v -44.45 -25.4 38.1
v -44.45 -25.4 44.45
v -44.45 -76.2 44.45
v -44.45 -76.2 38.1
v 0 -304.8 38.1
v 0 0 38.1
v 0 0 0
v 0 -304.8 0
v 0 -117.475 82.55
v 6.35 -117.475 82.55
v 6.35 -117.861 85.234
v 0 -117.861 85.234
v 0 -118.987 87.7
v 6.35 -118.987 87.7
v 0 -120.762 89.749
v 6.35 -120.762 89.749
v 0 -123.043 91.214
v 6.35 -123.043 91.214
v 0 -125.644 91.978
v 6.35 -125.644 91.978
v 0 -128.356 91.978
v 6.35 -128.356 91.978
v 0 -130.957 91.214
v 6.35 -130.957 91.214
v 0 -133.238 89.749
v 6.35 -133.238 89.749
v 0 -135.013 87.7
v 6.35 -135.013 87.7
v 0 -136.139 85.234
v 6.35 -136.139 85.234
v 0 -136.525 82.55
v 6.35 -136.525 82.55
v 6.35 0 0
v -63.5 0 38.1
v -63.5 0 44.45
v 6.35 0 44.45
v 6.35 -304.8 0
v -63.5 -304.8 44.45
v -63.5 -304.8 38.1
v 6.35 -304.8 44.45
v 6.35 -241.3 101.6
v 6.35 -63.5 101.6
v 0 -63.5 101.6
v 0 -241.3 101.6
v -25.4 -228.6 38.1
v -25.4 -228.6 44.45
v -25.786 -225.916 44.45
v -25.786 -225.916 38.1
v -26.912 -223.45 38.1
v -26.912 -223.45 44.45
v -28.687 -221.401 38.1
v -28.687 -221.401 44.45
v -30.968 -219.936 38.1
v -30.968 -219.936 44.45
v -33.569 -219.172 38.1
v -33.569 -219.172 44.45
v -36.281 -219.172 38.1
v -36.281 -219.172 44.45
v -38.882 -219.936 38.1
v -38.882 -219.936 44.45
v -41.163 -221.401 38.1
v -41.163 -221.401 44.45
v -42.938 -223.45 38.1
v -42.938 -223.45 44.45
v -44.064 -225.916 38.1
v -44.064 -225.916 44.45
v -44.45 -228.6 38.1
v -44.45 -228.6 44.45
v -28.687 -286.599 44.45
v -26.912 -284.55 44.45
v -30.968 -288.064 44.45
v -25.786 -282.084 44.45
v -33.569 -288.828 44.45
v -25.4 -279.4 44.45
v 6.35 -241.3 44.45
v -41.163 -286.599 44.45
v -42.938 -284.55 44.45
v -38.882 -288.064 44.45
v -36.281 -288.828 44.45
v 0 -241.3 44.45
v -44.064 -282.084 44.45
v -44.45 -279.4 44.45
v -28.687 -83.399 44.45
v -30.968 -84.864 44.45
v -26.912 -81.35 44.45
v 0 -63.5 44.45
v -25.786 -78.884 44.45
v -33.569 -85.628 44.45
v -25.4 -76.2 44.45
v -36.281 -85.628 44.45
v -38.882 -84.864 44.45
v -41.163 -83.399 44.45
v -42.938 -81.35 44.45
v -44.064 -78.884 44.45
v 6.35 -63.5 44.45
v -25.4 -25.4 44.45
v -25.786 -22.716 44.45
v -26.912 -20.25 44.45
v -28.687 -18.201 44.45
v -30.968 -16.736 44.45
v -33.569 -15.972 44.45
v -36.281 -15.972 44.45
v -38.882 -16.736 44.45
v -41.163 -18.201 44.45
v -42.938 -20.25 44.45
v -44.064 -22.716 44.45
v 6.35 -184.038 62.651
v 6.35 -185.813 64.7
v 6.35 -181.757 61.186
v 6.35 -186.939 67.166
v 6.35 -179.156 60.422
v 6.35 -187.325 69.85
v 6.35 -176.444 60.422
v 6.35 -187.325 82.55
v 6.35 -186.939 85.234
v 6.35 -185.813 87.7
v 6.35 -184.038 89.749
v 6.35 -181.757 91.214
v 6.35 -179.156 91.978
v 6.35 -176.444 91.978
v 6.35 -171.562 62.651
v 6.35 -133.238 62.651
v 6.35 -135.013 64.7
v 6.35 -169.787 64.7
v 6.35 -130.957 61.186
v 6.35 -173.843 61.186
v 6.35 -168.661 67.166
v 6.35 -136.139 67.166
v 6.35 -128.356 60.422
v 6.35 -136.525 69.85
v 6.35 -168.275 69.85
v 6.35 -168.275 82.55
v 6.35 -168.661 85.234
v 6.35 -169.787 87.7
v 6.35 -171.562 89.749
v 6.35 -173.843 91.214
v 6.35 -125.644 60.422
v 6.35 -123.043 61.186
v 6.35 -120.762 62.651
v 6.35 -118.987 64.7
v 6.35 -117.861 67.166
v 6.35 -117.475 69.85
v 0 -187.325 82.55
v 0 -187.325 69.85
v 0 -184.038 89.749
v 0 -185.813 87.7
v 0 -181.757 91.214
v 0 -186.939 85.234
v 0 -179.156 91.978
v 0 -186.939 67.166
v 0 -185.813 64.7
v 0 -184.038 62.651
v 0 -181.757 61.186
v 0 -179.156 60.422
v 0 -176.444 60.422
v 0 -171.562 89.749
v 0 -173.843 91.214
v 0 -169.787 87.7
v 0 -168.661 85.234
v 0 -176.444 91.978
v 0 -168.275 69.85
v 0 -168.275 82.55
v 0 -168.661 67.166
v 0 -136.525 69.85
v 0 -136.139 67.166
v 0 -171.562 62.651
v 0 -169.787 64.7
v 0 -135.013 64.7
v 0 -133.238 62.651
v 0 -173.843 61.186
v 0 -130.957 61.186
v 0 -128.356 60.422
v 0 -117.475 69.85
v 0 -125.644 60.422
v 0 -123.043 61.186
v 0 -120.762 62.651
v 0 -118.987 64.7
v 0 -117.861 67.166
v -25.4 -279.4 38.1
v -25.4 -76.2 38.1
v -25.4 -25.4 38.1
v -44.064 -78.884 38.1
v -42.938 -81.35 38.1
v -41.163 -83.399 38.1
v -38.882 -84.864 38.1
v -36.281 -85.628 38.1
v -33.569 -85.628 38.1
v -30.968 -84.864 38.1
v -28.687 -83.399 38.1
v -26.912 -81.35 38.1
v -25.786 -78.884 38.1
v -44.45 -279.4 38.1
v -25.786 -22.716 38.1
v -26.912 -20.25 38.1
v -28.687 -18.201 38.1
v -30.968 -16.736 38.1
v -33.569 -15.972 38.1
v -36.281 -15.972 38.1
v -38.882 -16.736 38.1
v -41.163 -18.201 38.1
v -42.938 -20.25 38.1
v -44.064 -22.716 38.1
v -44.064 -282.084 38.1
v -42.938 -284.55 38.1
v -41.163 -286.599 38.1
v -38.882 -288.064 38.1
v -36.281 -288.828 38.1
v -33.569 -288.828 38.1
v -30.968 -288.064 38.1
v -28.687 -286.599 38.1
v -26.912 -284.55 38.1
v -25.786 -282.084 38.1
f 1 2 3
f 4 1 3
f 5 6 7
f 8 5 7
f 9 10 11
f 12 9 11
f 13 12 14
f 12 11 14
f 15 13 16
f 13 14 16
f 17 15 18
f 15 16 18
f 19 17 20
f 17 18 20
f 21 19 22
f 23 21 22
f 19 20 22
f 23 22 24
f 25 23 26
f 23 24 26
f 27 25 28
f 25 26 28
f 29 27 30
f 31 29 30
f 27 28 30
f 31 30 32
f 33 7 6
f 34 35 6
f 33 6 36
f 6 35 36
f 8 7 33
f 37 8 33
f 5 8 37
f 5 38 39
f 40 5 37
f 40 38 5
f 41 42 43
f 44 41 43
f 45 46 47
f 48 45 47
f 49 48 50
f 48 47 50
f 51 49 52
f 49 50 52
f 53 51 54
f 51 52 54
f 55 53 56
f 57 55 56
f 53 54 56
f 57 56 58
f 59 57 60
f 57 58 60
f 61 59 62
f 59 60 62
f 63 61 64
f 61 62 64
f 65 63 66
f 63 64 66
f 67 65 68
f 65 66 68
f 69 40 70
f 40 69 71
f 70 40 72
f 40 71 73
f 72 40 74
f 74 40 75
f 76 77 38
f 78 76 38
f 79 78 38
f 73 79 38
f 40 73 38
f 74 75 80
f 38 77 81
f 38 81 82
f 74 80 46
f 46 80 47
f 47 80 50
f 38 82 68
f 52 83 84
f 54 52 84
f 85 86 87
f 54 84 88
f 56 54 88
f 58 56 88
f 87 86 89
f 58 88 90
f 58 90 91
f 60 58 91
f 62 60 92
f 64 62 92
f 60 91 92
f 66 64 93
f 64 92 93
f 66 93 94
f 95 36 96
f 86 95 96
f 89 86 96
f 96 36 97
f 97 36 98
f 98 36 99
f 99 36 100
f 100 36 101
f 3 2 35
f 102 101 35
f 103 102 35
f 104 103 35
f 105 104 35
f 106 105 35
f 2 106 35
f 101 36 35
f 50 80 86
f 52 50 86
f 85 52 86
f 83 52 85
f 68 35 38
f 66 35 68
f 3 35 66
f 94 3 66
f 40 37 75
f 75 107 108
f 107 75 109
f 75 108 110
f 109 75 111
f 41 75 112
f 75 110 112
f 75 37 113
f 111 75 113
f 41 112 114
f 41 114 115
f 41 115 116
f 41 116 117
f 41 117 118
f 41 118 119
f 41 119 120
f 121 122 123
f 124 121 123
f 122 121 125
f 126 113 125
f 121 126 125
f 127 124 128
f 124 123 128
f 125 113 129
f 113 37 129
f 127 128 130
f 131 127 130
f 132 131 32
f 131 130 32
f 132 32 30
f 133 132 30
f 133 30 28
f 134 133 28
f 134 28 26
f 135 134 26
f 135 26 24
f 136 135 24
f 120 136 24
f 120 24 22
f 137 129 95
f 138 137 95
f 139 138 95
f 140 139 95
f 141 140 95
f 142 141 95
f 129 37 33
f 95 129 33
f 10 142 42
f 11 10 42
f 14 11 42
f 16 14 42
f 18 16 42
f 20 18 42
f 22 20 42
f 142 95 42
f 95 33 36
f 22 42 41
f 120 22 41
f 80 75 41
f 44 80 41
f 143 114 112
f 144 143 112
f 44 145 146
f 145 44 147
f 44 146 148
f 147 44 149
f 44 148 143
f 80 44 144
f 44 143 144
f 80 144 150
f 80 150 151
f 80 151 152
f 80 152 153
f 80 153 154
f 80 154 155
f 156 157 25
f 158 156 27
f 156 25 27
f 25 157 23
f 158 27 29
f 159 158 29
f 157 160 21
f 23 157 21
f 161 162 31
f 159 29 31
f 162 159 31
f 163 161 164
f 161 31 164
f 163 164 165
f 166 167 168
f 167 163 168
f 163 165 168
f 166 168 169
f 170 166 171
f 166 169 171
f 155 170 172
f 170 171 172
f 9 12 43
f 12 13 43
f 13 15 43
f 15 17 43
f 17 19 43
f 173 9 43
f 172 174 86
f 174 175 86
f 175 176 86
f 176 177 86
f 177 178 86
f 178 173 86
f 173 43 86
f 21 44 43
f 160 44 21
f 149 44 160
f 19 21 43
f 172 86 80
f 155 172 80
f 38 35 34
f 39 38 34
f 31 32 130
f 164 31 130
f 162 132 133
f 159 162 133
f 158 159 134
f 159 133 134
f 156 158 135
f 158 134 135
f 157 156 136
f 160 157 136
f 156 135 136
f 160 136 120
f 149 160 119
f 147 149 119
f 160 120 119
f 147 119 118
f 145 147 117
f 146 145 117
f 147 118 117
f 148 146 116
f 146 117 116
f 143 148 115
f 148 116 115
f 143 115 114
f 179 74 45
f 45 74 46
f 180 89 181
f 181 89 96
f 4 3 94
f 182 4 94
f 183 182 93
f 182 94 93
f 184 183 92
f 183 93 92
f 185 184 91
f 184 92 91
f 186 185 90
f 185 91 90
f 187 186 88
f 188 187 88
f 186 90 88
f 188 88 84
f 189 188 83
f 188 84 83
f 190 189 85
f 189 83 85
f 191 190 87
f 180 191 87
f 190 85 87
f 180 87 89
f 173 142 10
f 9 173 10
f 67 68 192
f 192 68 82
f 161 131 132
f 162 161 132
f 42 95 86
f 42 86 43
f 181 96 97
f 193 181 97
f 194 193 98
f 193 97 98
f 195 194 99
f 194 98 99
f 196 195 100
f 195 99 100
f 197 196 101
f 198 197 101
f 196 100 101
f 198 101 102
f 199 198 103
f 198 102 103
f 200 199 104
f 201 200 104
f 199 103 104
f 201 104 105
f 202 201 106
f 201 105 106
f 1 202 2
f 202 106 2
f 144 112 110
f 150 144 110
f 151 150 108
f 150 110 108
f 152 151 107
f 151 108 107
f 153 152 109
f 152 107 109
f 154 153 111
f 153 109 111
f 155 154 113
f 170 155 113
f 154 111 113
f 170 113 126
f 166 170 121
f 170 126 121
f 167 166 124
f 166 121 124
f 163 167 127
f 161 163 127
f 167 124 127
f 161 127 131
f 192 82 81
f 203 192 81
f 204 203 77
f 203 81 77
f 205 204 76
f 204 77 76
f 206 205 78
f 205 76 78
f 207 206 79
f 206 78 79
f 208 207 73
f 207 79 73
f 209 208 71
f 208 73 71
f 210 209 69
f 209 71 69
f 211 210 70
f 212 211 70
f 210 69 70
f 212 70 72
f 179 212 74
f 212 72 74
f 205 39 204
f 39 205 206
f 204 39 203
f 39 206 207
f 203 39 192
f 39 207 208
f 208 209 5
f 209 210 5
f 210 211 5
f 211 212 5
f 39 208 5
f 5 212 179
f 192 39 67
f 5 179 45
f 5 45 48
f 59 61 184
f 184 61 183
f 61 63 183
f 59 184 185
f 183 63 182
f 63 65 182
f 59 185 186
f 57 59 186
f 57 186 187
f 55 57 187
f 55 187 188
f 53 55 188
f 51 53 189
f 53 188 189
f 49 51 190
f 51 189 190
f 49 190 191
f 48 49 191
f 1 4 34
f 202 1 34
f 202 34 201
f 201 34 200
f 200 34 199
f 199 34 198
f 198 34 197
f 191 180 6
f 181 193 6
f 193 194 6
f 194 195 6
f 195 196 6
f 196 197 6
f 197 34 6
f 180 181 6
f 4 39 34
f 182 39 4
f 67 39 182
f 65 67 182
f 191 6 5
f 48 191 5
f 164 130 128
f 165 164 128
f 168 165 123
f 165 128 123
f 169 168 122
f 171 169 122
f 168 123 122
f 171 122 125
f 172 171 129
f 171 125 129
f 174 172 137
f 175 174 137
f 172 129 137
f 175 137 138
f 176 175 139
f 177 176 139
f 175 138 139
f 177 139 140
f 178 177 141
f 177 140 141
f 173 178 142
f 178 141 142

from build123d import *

# Parameters (mm, degrees)
F1_DEPTH = 304.8
F2_W     = 63.5
F2_H     = 57.15
F3_DEPTH = 6.35
F5_DEPTH = 6.35


with BuildPart() as f1:
    # F0 (on Front) → F1 (new body)
    with BuildSketch(Plane.XZ):
        Polygon((0, 38.1), (0, 0), (6.35, 0), (6.35, 101.6), (0, 101.6), (0, 44.45), (-63.5, 44.45), (-63.5, 38.1), align=None)
    extrude(amount=F1_DEPTH)

    # F2 (on face) → F3 (cut, through all)
    with BuildSketch(Plane.YZ.offset(6.35)):
        with Locations((-273.05, 73.025)):
            Rectangle(F2_W, F2_H)
        with Locations((-31.75, 73.025)):
            Rectangle(F2_W, F2_H)
        with BuildLine():
            Line((-168.275, 69.85), (-168.275, 82.55))
            ThreePointArc((-168.275, 82.55), (-177.8, 92.075), (-187.325, 82.55))
            Line((-187.325, 82.55), (-187.325, 69.85))
            ThreePointArc((-187.325, 69.85), (-177.8, 60.325), (-168.275, 69.85))
        make_face()
        with BuildLine():
            ThreePointArc((-117.475, 82.55), (-127, 92.075), (-136.525, 82.55))
            Line((-136.525, 82.55), (-136.525, 69.85))
            ThreePointArc((-136.525, 69.85), (-127, 60.325), (-117.475, 69.85))
            Line((-117.475, 69.85), (-117.475, 82.55))
        make_face()
    extrude(amount=-F3_DEPTH, mode=Mode.SUBTRACT)

    # F4 (on face) → F5 (cut, through all)
    with BuildSketch(Plane.XY.offset(44.45)):
        with BuildLine():
            Line((-25.4, -279.4), (-25.4, -228.6))
            ThreePointArc((-25.4, -228.6), (-34.925, -219.075), (-44.45, -228.6))
            Line((-44.45, -228.6), (-44.45, -279.4))
            ThreePointArc((-44.45, -279.4), (-34.925, -288.925), (-25.4, -279.4))
        make_face()
        with BuildLine():
            ThreePointArc((-44.45, -76.2), (-34.925, -85.725), (-25.4, -76.2))
            Line((-25.4, -76.2), (-25.4, -25.4))
            ThreePointArc((-25.4, -25.4), (-34.925, -15.875), (-44.45, -25.4))
            Line((-44.45, -25.4), (-44.45, -76.2))
        make_face()
    extrude(amount=-F5_DEPTH, mode=Mode.SUBTRACT)


solid = f1.part
